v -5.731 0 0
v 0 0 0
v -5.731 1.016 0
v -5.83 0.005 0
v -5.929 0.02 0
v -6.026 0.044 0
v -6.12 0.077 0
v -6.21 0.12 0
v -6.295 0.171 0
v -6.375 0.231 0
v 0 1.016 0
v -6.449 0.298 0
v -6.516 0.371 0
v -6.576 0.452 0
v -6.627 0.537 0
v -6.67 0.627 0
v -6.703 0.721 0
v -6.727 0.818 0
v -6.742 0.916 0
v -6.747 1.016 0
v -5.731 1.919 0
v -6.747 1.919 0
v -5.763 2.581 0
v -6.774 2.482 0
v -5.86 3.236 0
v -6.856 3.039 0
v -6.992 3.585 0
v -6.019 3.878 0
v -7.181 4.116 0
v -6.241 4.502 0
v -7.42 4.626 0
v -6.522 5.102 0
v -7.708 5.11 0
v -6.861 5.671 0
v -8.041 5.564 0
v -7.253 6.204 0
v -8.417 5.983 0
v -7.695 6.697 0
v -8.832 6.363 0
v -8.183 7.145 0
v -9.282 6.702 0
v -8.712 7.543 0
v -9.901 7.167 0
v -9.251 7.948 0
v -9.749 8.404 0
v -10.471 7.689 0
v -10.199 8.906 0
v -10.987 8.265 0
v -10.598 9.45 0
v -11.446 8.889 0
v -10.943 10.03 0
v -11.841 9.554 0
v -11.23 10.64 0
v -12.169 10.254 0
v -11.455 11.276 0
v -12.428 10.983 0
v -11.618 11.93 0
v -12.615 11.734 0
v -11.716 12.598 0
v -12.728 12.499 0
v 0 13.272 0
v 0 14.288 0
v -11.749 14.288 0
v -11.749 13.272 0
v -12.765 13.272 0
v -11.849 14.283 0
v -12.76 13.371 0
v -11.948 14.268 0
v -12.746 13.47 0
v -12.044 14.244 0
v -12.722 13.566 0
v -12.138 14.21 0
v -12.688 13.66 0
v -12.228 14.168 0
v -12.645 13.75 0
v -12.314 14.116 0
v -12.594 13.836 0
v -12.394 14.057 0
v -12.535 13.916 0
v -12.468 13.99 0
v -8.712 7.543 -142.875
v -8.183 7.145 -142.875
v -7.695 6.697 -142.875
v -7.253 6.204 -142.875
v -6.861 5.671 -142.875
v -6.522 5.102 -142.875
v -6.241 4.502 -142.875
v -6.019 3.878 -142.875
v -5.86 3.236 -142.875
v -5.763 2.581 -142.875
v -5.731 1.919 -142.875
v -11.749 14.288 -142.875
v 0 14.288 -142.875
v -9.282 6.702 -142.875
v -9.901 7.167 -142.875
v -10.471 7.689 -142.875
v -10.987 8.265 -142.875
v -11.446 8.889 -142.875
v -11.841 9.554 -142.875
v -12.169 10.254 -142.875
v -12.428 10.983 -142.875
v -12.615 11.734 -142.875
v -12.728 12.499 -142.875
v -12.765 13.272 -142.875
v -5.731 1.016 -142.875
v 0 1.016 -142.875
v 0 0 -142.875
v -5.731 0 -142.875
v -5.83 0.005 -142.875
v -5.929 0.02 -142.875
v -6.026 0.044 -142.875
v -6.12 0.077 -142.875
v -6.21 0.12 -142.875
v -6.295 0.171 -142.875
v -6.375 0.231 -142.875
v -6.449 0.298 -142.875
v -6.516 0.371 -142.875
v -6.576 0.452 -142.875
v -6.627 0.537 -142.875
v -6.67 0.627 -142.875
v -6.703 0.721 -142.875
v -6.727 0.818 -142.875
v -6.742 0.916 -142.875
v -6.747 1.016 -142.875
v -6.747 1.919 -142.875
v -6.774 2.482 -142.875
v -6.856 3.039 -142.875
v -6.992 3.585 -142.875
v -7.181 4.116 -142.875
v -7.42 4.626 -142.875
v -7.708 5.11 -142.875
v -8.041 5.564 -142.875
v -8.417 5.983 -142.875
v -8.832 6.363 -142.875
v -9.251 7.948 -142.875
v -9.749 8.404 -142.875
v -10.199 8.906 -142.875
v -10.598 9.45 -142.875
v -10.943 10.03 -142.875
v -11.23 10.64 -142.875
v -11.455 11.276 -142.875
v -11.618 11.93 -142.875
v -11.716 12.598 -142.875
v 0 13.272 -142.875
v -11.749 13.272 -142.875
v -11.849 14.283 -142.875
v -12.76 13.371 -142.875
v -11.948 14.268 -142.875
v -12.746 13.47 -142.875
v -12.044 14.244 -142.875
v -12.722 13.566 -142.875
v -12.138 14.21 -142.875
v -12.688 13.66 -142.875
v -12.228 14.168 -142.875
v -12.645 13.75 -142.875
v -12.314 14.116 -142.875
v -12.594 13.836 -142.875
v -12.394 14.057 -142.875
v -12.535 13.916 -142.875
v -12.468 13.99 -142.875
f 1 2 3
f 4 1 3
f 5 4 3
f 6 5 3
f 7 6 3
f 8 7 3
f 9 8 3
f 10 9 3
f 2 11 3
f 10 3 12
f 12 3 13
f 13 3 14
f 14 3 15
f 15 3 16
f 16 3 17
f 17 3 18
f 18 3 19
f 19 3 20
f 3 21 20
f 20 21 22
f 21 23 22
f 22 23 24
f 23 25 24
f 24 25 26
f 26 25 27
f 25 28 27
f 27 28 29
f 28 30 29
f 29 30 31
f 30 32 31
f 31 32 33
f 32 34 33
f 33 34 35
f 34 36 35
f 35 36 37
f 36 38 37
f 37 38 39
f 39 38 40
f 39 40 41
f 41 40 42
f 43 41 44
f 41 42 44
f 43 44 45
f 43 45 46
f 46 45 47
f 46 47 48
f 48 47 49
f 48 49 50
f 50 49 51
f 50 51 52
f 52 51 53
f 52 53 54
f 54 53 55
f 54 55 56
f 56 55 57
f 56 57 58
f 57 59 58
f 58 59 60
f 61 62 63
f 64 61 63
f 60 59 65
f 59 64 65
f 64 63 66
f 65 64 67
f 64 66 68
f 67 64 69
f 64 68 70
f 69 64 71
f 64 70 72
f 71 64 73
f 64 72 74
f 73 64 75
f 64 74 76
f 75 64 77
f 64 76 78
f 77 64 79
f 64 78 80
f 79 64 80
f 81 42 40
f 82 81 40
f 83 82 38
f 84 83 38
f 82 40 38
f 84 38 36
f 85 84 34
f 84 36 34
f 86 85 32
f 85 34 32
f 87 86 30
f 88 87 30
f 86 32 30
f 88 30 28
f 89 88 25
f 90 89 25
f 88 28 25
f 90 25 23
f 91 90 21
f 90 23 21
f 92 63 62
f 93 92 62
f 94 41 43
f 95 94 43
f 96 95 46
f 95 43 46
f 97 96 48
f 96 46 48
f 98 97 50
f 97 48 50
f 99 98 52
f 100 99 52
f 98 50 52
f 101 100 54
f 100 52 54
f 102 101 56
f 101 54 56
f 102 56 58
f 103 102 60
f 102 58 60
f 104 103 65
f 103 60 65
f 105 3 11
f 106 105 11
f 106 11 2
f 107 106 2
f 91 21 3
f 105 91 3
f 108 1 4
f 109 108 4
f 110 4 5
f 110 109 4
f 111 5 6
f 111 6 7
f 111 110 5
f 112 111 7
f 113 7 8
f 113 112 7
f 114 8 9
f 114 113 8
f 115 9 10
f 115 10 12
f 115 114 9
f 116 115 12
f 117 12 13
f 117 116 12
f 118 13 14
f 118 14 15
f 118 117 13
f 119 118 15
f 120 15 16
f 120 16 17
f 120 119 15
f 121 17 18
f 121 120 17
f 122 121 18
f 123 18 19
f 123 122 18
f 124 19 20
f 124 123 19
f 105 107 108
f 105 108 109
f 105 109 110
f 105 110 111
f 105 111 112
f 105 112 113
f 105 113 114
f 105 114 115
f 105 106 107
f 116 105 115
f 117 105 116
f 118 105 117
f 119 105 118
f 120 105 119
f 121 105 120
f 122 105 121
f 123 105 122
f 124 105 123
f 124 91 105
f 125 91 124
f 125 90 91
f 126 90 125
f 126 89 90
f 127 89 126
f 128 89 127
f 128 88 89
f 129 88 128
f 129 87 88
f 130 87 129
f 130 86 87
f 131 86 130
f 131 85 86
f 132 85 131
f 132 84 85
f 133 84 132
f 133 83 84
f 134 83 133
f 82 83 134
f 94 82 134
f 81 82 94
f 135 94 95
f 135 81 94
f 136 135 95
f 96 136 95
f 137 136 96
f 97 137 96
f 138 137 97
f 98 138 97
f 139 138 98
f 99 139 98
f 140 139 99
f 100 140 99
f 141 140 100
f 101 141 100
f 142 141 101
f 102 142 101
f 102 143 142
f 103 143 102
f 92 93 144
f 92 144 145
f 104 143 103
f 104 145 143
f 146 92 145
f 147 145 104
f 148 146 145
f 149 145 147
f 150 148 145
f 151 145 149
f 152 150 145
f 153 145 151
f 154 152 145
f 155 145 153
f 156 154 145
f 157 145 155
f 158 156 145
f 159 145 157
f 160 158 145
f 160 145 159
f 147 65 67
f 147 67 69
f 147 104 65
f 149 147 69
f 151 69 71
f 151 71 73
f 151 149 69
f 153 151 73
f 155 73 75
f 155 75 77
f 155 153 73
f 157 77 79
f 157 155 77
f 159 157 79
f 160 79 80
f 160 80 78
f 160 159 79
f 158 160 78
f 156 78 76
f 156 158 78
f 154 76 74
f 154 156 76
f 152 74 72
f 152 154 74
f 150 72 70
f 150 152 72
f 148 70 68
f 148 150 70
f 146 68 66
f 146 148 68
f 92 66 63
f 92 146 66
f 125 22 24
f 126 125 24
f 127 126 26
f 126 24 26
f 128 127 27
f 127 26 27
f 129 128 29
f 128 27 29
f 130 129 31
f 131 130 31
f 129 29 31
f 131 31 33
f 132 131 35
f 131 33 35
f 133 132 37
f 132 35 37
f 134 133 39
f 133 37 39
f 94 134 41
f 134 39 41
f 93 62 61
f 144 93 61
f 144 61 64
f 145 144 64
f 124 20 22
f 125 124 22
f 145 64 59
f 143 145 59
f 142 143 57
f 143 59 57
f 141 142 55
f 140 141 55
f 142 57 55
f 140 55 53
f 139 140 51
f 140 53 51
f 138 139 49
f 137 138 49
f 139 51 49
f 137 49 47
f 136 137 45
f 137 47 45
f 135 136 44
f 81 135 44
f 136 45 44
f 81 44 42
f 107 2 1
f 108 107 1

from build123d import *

# Parameters (mm, degrees)
EXTRUDE_THIN1_DEPTH = 142.875
FILLET1_R           = 1.016


with BuildPart() as part:
    # Sketch1 → Extrude-Thin1 (new body)
    with BuildSketch(Plane.XY):
        with BuildLine():
            Line((0, 0), (-6.746875, 0))
            Line((-6.746875, 0), (-6.746875, 1.919148688))
            ThreePointArc((-6.746875, 1.919148688), (-7.41996004, 4.62577026), (-9.28241202, 6.70185225))
            ThreePointArc((-9.28241202, 6.70185225), (-12.064724111, 10.011020322), (-12.7, 14.2875))
            Line((-12.7, 14.2875), (0, 14.2875))
            Line((0, 14.2875), (0, 13.2715))
            Line((0, 13.2715), (-11.749292543, 13.2715))
            ThreePointArc((-11.749292543, 13.2715), (-10.943069803, 10.029502732), (-8.712220727, 7.542767162))
            ThreePointArc((-8.712220727, 7.542767162), (-6.522304662, 5.101659767), (-5.730875, 1.919148688))
            Line((-5.730875, 1.919148688), (-5.730875, 1.016))
            Line((-5.730875, 1.016), (0, 1.016))
            Line((0, 1.016), (0, 0))
        make_face()
    extrude(amount=-EXTRUDE_THIN1_DEPTH)

    # Fillet1
    fillet1_edges = [part.edges().sort_by_distance(p)[0] for p in [
        (-6.746875, 0, -71.4375),
        (-12.7, 14.2875, -71.4375),
    ]]
    fillet(fillet1_edges, radius=FILLET1_R)


solid = part.part
